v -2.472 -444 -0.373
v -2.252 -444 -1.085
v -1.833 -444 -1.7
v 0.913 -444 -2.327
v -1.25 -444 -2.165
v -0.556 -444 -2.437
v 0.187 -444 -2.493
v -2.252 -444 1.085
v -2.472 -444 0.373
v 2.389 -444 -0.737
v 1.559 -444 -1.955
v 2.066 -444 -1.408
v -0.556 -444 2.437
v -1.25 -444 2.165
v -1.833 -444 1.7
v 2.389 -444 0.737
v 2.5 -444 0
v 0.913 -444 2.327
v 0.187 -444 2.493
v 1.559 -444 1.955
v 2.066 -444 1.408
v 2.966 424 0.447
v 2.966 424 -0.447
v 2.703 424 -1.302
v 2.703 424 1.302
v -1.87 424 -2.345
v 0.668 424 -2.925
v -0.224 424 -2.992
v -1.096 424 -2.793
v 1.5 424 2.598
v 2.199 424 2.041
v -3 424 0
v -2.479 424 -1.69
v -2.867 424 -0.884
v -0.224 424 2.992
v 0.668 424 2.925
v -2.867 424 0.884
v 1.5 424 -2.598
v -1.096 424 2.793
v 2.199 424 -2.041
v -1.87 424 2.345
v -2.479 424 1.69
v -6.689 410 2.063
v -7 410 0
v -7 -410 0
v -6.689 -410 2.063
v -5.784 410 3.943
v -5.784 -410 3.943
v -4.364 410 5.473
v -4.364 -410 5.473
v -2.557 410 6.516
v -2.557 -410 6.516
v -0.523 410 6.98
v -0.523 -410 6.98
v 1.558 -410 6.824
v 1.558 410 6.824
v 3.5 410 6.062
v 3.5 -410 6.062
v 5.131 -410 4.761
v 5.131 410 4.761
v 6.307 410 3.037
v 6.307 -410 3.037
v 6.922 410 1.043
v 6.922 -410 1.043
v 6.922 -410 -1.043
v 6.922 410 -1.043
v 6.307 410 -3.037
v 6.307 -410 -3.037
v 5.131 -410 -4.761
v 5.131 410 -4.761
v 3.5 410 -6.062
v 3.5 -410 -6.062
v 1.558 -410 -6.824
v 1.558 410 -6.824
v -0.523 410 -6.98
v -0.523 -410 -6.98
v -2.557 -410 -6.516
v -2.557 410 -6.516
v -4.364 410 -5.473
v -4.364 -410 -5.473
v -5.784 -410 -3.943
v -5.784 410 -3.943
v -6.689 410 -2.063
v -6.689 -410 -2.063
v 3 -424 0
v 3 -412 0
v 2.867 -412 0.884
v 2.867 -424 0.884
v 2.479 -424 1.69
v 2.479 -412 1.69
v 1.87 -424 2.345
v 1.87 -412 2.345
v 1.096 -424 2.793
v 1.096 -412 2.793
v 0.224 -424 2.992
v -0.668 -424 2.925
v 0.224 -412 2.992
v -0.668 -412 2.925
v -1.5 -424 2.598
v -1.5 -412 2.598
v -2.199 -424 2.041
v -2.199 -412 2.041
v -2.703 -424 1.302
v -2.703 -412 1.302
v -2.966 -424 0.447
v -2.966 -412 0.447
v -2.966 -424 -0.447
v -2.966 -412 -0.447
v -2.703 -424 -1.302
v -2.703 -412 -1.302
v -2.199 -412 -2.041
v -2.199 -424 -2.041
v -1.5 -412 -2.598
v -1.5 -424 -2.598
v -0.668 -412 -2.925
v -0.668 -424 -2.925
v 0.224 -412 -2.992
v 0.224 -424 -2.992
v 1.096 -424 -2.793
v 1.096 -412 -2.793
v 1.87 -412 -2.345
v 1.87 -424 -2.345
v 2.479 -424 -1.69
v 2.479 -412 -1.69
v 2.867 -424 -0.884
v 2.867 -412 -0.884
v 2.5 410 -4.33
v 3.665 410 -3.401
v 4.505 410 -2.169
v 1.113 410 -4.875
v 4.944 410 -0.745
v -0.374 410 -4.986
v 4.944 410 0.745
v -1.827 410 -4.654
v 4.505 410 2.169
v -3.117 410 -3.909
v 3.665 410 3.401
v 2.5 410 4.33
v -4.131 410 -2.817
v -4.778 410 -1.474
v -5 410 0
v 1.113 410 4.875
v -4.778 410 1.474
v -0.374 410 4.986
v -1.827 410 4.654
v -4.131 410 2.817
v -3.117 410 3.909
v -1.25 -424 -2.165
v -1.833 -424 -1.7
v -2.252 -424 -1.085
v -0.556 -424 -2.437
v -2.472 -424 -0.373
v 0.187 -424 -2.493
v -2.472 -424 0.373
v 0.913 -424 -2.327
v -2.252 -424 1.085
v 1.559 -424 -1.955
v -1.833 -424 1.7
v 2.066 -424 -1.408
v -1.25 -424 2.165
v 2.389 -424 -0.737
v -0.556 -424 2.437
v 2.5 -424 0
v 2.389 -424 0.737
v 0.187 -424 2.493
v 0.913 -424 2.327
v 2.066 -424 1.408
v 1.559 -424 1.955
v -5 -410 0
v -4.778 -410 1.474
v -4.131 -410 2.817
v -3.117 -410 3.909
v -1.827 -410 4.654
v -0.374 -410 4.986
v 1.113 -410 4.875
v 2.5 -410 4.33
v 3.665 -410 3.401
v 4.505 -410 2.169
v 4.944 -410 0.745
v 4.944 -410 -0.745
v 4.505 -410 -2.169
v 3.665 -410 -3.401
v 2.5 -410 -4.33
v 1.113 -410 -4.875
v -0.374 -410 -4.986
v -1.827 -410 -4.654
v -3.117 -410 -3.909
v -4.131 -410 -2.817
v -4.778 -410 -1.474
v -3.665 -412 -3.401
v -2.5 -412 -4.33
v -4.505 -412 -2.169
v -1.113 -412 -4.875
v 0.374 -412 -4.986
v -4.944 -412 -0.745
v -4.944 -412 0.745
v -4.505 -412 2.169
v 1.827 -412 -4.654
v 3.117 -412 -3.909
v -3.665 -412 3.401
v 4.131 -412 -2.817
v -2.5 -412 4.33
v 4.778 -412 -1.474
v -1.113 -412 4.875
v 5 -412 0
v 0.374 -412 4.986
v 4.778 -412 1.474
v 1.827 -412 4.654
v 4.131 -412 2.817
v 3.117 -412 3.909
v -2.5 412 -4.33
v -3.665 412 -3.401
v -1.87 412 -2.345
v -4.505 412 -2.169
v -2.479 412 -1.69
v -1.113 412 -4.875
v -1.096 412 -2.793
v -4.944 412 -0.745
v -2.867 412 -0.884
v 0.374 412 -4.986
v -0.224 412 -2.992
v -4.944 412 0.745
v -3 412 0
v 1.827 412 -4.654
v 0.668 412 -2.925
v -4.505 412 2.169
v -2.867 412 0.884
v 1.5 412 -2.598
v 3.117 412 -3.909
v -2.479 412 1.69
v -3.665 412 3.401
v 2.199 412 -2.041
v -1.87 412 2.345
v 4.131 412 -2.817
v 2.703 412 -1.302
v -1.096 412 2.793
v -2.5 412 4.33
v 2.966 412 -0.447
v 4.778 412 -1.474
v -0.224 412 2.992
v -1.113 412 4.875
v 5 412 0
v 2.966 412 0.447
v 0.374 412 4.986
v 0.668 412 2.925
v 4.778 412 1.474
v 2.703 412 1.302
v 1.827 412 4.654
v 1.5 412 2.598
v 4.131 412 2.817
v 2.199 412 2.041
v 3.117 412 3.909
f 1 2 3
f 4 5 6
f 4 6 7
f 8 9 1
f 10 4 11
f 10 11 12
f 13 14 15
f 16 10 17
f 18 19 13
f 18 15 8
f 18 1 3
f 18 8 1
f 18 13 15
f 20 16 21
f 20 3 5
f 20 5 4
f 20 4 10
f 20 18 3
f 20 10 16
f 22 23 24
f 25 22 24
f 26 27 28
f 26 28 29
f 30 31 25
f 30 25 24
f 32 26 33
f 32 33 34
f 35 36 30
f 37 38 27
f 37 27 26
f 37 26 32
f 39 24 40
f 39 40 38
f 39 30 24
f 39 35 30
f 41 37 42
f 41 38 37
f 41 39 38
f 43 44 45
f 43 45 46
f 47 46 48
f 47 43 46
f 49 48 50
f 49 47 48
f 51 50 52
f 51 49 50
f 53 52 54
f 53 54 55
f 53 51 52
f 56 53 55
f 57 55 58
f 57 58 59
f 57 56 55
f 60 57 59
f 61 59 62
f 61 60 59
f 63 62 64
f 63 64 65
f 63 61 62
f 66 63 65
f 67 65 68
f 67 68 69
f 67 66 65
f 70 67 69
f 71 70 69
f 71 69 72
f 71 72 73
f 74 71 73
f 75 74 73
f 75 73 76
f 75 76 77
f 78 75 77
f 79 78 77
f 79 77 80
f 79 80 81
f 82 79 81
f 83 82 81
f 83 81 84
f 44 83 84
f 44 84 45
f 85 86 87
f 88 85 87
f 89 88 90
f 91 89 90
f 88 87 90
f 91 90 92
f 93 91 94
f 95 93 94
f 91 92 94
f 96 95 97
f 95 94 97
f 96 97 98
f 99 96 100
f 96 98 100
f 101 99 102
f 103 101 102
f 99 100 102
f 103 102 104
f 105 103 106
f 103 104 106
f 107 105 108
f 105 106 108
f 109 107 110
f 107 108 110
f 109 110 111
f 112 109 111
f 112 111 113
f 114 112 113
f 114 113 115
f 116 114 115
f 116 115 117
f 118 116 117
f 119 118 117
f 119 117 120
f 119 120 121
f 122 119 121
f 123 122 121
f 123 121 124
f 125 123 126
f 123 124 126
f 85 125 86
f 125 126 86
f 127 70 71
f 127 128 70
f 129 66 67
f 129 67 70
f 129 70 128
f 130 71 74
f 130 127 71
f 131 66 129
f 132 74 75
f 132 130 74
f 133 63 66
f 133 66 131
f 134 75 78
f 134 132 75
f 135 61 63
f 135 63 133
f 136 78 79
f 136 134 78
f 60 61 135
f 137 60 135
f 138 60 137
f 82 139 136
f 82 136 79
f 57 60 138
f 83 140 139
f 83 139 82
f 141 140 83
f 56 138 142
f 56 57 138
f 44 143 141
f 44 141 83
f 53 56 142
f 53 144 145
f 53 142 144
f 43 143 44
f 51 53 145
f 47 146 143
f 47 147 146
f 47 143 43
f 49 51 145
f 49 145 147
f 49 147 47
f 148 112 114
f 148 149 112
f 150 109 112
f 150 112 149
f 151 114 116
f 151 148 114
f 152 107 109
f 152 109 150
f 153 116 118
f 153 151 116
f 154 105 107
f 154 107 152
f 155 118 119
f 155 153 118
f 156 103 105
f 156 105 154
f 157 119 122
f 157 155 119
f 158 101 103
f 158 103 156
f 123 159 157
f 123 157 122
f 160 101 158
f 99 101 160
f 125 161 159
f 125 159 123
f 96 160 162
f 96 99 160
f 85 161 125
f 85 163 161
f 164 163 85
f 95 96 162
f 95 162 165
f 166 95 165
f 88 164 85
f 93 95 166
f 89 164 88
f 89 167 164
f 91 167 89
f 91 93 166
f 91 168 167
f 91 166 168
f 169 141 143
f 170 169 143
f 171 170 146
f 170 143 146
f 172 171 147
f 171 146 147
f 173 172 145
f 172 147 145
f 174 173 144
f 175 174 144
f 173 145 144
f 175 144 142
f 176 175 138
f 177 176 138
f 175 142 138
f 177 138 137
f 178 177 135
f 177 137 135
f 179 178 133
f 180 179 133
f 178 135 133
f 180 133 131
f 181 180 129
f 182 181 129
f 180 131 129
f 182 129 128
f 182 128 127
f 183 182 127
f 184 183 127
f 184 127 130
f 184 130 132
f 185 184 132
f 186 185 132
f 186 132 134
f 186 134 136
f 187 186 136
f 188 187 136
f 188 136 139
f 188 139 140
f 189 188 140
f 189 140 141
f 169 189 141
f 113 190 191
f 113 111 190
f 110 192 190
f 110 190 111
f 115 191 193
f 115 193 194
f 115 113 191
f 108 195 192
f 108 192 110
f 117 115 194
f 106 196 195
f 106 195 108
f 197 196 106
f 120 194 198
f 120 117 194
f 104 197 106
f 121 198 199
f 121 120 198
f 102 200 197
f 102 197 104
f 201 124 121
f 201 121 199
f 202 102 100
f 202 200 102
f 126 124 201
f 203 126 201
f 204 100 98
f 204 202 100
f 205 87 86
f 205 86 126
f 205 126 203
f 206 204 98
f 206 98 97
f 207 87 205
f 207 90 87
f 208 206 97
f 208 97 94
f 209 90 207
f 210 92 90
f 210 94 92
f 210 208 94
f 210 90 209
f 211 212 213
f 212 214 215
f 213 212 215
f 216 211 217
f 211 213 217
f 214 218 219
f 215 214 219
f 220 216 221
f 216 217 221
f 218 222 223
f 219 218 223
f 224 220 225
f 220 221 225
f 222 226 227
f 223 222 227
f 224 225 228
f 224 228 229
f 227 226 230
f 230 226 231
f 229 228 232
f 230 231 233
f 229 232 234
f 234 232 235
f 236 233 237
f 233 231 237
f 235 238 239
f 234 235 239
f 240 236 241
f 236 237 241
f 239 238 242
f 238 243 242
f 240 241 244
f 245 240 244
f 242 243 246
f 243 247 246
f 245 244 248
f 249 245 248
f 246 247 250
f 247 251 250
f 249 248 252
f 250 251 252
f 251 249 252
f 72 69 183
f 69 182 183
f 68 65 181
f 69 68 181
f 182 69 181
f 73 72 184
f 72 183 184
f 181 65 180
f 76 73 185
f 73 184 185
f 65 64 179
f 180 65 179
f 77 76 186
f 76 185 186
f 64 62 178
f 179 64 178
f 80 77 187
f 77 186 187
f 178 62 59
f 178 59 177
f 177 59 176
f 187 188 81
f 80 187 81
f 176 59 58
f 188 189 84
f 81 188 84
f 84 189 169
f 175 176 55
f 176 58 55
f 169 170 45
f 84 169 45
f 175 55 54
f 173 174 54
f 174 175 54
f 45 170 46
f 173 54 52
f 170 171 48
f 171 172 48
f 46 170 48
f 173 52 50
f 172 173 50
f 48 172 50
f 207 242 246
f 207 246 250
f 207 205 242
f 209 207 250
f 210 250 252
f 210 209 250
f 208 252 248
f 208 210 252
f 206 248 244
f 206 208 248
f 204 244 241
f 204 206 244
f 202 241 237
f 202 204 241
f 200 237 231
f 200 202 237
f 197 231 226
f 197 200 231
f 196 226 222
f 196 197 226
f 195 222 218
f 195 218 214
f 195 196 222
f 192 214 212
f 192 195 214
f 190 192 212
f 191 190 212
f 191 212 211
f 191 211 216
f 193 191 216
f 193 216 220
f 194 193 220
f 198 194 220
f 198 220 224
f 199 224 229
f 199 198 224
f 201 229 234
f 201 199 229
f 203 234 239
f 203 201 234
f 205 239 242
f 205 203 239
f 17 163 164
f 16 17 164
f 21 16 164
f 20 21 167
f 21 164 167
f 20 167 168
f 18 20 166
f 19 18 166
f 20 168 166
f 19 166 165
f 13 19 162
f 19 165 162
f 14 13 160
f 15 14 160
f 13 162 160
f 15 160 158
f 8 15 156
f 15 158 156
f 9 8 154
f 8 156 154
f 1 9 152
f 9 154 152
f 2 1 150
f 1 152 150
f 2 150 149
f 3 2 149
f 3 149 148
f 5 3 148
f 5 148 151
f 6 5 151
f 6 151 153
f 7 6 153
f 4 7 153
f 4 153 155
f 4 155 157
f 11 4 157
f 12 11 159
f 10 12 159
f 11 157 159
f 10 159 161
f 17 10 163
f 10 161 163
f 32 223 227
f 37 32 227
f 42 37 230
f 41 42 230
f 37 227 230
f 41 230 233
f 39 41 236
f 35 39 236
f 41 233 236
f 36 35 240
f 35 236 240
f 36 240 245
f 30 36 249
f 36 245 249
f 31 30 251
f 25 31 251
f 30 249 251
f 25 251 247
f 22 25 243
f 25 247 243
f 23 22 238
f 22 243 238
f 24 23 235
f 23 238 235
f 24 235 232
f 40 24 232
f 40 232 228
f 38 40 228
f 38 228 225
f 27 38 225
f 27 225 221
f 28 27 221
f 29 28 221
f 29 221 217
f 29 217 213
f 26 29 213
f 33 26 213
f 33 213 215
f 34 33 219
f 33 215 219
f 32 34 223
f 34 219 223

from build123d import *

# Parameters (mm, degrees)
F0_R      = 5
F1_DEPTH  = 412
F2_R      = 3
F3_DEPTH  = 12
F4_R      = 3
F5_DEPTH  = 12
F6_R      = 7
F6_R_2    = 5
F7_DEPTH  = 824
F8_R      = 2.5
F9_DEPTH  = 20
F10_DEPTH = 2
F11_DEPTH = 2


with BuildPart() as f1:
    # F0 (on Front) → F1 (new body, symmetric)
    with BuildSketch(Plane.XZ):
        Circle(F0_R)
    extrude(amount=F1_DEPTH, both=True)

    # F2 (on face) → F3 (join)
    with BuildSketch(Plane.XZ.offset(412)):
        Circle(F2_R)
    extrude(amount=F3_DEPTH)

    # F4 (on face) → F5 (join)
    with BuildSketch(Plane(origin=(0, 412, 0), x_dir=(-1, 0, 0), z_dir=(0, 1, 0))):
        Circle(F4_R)
    extrude(amount=F5_DEPTH)

    # F8 (on face) → F9 (join)
    with BuildSketch(Plane.XZ.offset(424)):
        Circle(F8_R)
    extrude(amount=F9_DEPTH)


with BuildPart() as f7:
    # F6 (on face) → F7 (new body, through all)
    with BuildSketch(Plane(origin=(0, 412, 0), x_dir=(-1, 0, 0), z_dir=(0, 1, 0))):
        Circle(F6_R)
        Circle(F6_R_2, mode=Mode.SUBTRACT)
    extrude(amount=-F7_DEPTH)

    # F10 (cut): a face of the model
    f10_faces = [f7.faces().sort_by_distance(p)[0] for p in [
        (6.8020101013, 412, 0),
    ]]
    extrude(f10_faces, amount=-F10_DEPTH, mode=Mode.SUBTRACT)

    # F11 (cut): a face of the model
    f11_faces = [f7.faces().sort_by_distance(p)[0] for p in [
        (6.8020101013, -412, 0),
    ]]
    extrude(f11_faces, amount=-F11_DEPTH, mode=Mode.SUBTRACT)


solid = Compound([f1.part, f7.part])
